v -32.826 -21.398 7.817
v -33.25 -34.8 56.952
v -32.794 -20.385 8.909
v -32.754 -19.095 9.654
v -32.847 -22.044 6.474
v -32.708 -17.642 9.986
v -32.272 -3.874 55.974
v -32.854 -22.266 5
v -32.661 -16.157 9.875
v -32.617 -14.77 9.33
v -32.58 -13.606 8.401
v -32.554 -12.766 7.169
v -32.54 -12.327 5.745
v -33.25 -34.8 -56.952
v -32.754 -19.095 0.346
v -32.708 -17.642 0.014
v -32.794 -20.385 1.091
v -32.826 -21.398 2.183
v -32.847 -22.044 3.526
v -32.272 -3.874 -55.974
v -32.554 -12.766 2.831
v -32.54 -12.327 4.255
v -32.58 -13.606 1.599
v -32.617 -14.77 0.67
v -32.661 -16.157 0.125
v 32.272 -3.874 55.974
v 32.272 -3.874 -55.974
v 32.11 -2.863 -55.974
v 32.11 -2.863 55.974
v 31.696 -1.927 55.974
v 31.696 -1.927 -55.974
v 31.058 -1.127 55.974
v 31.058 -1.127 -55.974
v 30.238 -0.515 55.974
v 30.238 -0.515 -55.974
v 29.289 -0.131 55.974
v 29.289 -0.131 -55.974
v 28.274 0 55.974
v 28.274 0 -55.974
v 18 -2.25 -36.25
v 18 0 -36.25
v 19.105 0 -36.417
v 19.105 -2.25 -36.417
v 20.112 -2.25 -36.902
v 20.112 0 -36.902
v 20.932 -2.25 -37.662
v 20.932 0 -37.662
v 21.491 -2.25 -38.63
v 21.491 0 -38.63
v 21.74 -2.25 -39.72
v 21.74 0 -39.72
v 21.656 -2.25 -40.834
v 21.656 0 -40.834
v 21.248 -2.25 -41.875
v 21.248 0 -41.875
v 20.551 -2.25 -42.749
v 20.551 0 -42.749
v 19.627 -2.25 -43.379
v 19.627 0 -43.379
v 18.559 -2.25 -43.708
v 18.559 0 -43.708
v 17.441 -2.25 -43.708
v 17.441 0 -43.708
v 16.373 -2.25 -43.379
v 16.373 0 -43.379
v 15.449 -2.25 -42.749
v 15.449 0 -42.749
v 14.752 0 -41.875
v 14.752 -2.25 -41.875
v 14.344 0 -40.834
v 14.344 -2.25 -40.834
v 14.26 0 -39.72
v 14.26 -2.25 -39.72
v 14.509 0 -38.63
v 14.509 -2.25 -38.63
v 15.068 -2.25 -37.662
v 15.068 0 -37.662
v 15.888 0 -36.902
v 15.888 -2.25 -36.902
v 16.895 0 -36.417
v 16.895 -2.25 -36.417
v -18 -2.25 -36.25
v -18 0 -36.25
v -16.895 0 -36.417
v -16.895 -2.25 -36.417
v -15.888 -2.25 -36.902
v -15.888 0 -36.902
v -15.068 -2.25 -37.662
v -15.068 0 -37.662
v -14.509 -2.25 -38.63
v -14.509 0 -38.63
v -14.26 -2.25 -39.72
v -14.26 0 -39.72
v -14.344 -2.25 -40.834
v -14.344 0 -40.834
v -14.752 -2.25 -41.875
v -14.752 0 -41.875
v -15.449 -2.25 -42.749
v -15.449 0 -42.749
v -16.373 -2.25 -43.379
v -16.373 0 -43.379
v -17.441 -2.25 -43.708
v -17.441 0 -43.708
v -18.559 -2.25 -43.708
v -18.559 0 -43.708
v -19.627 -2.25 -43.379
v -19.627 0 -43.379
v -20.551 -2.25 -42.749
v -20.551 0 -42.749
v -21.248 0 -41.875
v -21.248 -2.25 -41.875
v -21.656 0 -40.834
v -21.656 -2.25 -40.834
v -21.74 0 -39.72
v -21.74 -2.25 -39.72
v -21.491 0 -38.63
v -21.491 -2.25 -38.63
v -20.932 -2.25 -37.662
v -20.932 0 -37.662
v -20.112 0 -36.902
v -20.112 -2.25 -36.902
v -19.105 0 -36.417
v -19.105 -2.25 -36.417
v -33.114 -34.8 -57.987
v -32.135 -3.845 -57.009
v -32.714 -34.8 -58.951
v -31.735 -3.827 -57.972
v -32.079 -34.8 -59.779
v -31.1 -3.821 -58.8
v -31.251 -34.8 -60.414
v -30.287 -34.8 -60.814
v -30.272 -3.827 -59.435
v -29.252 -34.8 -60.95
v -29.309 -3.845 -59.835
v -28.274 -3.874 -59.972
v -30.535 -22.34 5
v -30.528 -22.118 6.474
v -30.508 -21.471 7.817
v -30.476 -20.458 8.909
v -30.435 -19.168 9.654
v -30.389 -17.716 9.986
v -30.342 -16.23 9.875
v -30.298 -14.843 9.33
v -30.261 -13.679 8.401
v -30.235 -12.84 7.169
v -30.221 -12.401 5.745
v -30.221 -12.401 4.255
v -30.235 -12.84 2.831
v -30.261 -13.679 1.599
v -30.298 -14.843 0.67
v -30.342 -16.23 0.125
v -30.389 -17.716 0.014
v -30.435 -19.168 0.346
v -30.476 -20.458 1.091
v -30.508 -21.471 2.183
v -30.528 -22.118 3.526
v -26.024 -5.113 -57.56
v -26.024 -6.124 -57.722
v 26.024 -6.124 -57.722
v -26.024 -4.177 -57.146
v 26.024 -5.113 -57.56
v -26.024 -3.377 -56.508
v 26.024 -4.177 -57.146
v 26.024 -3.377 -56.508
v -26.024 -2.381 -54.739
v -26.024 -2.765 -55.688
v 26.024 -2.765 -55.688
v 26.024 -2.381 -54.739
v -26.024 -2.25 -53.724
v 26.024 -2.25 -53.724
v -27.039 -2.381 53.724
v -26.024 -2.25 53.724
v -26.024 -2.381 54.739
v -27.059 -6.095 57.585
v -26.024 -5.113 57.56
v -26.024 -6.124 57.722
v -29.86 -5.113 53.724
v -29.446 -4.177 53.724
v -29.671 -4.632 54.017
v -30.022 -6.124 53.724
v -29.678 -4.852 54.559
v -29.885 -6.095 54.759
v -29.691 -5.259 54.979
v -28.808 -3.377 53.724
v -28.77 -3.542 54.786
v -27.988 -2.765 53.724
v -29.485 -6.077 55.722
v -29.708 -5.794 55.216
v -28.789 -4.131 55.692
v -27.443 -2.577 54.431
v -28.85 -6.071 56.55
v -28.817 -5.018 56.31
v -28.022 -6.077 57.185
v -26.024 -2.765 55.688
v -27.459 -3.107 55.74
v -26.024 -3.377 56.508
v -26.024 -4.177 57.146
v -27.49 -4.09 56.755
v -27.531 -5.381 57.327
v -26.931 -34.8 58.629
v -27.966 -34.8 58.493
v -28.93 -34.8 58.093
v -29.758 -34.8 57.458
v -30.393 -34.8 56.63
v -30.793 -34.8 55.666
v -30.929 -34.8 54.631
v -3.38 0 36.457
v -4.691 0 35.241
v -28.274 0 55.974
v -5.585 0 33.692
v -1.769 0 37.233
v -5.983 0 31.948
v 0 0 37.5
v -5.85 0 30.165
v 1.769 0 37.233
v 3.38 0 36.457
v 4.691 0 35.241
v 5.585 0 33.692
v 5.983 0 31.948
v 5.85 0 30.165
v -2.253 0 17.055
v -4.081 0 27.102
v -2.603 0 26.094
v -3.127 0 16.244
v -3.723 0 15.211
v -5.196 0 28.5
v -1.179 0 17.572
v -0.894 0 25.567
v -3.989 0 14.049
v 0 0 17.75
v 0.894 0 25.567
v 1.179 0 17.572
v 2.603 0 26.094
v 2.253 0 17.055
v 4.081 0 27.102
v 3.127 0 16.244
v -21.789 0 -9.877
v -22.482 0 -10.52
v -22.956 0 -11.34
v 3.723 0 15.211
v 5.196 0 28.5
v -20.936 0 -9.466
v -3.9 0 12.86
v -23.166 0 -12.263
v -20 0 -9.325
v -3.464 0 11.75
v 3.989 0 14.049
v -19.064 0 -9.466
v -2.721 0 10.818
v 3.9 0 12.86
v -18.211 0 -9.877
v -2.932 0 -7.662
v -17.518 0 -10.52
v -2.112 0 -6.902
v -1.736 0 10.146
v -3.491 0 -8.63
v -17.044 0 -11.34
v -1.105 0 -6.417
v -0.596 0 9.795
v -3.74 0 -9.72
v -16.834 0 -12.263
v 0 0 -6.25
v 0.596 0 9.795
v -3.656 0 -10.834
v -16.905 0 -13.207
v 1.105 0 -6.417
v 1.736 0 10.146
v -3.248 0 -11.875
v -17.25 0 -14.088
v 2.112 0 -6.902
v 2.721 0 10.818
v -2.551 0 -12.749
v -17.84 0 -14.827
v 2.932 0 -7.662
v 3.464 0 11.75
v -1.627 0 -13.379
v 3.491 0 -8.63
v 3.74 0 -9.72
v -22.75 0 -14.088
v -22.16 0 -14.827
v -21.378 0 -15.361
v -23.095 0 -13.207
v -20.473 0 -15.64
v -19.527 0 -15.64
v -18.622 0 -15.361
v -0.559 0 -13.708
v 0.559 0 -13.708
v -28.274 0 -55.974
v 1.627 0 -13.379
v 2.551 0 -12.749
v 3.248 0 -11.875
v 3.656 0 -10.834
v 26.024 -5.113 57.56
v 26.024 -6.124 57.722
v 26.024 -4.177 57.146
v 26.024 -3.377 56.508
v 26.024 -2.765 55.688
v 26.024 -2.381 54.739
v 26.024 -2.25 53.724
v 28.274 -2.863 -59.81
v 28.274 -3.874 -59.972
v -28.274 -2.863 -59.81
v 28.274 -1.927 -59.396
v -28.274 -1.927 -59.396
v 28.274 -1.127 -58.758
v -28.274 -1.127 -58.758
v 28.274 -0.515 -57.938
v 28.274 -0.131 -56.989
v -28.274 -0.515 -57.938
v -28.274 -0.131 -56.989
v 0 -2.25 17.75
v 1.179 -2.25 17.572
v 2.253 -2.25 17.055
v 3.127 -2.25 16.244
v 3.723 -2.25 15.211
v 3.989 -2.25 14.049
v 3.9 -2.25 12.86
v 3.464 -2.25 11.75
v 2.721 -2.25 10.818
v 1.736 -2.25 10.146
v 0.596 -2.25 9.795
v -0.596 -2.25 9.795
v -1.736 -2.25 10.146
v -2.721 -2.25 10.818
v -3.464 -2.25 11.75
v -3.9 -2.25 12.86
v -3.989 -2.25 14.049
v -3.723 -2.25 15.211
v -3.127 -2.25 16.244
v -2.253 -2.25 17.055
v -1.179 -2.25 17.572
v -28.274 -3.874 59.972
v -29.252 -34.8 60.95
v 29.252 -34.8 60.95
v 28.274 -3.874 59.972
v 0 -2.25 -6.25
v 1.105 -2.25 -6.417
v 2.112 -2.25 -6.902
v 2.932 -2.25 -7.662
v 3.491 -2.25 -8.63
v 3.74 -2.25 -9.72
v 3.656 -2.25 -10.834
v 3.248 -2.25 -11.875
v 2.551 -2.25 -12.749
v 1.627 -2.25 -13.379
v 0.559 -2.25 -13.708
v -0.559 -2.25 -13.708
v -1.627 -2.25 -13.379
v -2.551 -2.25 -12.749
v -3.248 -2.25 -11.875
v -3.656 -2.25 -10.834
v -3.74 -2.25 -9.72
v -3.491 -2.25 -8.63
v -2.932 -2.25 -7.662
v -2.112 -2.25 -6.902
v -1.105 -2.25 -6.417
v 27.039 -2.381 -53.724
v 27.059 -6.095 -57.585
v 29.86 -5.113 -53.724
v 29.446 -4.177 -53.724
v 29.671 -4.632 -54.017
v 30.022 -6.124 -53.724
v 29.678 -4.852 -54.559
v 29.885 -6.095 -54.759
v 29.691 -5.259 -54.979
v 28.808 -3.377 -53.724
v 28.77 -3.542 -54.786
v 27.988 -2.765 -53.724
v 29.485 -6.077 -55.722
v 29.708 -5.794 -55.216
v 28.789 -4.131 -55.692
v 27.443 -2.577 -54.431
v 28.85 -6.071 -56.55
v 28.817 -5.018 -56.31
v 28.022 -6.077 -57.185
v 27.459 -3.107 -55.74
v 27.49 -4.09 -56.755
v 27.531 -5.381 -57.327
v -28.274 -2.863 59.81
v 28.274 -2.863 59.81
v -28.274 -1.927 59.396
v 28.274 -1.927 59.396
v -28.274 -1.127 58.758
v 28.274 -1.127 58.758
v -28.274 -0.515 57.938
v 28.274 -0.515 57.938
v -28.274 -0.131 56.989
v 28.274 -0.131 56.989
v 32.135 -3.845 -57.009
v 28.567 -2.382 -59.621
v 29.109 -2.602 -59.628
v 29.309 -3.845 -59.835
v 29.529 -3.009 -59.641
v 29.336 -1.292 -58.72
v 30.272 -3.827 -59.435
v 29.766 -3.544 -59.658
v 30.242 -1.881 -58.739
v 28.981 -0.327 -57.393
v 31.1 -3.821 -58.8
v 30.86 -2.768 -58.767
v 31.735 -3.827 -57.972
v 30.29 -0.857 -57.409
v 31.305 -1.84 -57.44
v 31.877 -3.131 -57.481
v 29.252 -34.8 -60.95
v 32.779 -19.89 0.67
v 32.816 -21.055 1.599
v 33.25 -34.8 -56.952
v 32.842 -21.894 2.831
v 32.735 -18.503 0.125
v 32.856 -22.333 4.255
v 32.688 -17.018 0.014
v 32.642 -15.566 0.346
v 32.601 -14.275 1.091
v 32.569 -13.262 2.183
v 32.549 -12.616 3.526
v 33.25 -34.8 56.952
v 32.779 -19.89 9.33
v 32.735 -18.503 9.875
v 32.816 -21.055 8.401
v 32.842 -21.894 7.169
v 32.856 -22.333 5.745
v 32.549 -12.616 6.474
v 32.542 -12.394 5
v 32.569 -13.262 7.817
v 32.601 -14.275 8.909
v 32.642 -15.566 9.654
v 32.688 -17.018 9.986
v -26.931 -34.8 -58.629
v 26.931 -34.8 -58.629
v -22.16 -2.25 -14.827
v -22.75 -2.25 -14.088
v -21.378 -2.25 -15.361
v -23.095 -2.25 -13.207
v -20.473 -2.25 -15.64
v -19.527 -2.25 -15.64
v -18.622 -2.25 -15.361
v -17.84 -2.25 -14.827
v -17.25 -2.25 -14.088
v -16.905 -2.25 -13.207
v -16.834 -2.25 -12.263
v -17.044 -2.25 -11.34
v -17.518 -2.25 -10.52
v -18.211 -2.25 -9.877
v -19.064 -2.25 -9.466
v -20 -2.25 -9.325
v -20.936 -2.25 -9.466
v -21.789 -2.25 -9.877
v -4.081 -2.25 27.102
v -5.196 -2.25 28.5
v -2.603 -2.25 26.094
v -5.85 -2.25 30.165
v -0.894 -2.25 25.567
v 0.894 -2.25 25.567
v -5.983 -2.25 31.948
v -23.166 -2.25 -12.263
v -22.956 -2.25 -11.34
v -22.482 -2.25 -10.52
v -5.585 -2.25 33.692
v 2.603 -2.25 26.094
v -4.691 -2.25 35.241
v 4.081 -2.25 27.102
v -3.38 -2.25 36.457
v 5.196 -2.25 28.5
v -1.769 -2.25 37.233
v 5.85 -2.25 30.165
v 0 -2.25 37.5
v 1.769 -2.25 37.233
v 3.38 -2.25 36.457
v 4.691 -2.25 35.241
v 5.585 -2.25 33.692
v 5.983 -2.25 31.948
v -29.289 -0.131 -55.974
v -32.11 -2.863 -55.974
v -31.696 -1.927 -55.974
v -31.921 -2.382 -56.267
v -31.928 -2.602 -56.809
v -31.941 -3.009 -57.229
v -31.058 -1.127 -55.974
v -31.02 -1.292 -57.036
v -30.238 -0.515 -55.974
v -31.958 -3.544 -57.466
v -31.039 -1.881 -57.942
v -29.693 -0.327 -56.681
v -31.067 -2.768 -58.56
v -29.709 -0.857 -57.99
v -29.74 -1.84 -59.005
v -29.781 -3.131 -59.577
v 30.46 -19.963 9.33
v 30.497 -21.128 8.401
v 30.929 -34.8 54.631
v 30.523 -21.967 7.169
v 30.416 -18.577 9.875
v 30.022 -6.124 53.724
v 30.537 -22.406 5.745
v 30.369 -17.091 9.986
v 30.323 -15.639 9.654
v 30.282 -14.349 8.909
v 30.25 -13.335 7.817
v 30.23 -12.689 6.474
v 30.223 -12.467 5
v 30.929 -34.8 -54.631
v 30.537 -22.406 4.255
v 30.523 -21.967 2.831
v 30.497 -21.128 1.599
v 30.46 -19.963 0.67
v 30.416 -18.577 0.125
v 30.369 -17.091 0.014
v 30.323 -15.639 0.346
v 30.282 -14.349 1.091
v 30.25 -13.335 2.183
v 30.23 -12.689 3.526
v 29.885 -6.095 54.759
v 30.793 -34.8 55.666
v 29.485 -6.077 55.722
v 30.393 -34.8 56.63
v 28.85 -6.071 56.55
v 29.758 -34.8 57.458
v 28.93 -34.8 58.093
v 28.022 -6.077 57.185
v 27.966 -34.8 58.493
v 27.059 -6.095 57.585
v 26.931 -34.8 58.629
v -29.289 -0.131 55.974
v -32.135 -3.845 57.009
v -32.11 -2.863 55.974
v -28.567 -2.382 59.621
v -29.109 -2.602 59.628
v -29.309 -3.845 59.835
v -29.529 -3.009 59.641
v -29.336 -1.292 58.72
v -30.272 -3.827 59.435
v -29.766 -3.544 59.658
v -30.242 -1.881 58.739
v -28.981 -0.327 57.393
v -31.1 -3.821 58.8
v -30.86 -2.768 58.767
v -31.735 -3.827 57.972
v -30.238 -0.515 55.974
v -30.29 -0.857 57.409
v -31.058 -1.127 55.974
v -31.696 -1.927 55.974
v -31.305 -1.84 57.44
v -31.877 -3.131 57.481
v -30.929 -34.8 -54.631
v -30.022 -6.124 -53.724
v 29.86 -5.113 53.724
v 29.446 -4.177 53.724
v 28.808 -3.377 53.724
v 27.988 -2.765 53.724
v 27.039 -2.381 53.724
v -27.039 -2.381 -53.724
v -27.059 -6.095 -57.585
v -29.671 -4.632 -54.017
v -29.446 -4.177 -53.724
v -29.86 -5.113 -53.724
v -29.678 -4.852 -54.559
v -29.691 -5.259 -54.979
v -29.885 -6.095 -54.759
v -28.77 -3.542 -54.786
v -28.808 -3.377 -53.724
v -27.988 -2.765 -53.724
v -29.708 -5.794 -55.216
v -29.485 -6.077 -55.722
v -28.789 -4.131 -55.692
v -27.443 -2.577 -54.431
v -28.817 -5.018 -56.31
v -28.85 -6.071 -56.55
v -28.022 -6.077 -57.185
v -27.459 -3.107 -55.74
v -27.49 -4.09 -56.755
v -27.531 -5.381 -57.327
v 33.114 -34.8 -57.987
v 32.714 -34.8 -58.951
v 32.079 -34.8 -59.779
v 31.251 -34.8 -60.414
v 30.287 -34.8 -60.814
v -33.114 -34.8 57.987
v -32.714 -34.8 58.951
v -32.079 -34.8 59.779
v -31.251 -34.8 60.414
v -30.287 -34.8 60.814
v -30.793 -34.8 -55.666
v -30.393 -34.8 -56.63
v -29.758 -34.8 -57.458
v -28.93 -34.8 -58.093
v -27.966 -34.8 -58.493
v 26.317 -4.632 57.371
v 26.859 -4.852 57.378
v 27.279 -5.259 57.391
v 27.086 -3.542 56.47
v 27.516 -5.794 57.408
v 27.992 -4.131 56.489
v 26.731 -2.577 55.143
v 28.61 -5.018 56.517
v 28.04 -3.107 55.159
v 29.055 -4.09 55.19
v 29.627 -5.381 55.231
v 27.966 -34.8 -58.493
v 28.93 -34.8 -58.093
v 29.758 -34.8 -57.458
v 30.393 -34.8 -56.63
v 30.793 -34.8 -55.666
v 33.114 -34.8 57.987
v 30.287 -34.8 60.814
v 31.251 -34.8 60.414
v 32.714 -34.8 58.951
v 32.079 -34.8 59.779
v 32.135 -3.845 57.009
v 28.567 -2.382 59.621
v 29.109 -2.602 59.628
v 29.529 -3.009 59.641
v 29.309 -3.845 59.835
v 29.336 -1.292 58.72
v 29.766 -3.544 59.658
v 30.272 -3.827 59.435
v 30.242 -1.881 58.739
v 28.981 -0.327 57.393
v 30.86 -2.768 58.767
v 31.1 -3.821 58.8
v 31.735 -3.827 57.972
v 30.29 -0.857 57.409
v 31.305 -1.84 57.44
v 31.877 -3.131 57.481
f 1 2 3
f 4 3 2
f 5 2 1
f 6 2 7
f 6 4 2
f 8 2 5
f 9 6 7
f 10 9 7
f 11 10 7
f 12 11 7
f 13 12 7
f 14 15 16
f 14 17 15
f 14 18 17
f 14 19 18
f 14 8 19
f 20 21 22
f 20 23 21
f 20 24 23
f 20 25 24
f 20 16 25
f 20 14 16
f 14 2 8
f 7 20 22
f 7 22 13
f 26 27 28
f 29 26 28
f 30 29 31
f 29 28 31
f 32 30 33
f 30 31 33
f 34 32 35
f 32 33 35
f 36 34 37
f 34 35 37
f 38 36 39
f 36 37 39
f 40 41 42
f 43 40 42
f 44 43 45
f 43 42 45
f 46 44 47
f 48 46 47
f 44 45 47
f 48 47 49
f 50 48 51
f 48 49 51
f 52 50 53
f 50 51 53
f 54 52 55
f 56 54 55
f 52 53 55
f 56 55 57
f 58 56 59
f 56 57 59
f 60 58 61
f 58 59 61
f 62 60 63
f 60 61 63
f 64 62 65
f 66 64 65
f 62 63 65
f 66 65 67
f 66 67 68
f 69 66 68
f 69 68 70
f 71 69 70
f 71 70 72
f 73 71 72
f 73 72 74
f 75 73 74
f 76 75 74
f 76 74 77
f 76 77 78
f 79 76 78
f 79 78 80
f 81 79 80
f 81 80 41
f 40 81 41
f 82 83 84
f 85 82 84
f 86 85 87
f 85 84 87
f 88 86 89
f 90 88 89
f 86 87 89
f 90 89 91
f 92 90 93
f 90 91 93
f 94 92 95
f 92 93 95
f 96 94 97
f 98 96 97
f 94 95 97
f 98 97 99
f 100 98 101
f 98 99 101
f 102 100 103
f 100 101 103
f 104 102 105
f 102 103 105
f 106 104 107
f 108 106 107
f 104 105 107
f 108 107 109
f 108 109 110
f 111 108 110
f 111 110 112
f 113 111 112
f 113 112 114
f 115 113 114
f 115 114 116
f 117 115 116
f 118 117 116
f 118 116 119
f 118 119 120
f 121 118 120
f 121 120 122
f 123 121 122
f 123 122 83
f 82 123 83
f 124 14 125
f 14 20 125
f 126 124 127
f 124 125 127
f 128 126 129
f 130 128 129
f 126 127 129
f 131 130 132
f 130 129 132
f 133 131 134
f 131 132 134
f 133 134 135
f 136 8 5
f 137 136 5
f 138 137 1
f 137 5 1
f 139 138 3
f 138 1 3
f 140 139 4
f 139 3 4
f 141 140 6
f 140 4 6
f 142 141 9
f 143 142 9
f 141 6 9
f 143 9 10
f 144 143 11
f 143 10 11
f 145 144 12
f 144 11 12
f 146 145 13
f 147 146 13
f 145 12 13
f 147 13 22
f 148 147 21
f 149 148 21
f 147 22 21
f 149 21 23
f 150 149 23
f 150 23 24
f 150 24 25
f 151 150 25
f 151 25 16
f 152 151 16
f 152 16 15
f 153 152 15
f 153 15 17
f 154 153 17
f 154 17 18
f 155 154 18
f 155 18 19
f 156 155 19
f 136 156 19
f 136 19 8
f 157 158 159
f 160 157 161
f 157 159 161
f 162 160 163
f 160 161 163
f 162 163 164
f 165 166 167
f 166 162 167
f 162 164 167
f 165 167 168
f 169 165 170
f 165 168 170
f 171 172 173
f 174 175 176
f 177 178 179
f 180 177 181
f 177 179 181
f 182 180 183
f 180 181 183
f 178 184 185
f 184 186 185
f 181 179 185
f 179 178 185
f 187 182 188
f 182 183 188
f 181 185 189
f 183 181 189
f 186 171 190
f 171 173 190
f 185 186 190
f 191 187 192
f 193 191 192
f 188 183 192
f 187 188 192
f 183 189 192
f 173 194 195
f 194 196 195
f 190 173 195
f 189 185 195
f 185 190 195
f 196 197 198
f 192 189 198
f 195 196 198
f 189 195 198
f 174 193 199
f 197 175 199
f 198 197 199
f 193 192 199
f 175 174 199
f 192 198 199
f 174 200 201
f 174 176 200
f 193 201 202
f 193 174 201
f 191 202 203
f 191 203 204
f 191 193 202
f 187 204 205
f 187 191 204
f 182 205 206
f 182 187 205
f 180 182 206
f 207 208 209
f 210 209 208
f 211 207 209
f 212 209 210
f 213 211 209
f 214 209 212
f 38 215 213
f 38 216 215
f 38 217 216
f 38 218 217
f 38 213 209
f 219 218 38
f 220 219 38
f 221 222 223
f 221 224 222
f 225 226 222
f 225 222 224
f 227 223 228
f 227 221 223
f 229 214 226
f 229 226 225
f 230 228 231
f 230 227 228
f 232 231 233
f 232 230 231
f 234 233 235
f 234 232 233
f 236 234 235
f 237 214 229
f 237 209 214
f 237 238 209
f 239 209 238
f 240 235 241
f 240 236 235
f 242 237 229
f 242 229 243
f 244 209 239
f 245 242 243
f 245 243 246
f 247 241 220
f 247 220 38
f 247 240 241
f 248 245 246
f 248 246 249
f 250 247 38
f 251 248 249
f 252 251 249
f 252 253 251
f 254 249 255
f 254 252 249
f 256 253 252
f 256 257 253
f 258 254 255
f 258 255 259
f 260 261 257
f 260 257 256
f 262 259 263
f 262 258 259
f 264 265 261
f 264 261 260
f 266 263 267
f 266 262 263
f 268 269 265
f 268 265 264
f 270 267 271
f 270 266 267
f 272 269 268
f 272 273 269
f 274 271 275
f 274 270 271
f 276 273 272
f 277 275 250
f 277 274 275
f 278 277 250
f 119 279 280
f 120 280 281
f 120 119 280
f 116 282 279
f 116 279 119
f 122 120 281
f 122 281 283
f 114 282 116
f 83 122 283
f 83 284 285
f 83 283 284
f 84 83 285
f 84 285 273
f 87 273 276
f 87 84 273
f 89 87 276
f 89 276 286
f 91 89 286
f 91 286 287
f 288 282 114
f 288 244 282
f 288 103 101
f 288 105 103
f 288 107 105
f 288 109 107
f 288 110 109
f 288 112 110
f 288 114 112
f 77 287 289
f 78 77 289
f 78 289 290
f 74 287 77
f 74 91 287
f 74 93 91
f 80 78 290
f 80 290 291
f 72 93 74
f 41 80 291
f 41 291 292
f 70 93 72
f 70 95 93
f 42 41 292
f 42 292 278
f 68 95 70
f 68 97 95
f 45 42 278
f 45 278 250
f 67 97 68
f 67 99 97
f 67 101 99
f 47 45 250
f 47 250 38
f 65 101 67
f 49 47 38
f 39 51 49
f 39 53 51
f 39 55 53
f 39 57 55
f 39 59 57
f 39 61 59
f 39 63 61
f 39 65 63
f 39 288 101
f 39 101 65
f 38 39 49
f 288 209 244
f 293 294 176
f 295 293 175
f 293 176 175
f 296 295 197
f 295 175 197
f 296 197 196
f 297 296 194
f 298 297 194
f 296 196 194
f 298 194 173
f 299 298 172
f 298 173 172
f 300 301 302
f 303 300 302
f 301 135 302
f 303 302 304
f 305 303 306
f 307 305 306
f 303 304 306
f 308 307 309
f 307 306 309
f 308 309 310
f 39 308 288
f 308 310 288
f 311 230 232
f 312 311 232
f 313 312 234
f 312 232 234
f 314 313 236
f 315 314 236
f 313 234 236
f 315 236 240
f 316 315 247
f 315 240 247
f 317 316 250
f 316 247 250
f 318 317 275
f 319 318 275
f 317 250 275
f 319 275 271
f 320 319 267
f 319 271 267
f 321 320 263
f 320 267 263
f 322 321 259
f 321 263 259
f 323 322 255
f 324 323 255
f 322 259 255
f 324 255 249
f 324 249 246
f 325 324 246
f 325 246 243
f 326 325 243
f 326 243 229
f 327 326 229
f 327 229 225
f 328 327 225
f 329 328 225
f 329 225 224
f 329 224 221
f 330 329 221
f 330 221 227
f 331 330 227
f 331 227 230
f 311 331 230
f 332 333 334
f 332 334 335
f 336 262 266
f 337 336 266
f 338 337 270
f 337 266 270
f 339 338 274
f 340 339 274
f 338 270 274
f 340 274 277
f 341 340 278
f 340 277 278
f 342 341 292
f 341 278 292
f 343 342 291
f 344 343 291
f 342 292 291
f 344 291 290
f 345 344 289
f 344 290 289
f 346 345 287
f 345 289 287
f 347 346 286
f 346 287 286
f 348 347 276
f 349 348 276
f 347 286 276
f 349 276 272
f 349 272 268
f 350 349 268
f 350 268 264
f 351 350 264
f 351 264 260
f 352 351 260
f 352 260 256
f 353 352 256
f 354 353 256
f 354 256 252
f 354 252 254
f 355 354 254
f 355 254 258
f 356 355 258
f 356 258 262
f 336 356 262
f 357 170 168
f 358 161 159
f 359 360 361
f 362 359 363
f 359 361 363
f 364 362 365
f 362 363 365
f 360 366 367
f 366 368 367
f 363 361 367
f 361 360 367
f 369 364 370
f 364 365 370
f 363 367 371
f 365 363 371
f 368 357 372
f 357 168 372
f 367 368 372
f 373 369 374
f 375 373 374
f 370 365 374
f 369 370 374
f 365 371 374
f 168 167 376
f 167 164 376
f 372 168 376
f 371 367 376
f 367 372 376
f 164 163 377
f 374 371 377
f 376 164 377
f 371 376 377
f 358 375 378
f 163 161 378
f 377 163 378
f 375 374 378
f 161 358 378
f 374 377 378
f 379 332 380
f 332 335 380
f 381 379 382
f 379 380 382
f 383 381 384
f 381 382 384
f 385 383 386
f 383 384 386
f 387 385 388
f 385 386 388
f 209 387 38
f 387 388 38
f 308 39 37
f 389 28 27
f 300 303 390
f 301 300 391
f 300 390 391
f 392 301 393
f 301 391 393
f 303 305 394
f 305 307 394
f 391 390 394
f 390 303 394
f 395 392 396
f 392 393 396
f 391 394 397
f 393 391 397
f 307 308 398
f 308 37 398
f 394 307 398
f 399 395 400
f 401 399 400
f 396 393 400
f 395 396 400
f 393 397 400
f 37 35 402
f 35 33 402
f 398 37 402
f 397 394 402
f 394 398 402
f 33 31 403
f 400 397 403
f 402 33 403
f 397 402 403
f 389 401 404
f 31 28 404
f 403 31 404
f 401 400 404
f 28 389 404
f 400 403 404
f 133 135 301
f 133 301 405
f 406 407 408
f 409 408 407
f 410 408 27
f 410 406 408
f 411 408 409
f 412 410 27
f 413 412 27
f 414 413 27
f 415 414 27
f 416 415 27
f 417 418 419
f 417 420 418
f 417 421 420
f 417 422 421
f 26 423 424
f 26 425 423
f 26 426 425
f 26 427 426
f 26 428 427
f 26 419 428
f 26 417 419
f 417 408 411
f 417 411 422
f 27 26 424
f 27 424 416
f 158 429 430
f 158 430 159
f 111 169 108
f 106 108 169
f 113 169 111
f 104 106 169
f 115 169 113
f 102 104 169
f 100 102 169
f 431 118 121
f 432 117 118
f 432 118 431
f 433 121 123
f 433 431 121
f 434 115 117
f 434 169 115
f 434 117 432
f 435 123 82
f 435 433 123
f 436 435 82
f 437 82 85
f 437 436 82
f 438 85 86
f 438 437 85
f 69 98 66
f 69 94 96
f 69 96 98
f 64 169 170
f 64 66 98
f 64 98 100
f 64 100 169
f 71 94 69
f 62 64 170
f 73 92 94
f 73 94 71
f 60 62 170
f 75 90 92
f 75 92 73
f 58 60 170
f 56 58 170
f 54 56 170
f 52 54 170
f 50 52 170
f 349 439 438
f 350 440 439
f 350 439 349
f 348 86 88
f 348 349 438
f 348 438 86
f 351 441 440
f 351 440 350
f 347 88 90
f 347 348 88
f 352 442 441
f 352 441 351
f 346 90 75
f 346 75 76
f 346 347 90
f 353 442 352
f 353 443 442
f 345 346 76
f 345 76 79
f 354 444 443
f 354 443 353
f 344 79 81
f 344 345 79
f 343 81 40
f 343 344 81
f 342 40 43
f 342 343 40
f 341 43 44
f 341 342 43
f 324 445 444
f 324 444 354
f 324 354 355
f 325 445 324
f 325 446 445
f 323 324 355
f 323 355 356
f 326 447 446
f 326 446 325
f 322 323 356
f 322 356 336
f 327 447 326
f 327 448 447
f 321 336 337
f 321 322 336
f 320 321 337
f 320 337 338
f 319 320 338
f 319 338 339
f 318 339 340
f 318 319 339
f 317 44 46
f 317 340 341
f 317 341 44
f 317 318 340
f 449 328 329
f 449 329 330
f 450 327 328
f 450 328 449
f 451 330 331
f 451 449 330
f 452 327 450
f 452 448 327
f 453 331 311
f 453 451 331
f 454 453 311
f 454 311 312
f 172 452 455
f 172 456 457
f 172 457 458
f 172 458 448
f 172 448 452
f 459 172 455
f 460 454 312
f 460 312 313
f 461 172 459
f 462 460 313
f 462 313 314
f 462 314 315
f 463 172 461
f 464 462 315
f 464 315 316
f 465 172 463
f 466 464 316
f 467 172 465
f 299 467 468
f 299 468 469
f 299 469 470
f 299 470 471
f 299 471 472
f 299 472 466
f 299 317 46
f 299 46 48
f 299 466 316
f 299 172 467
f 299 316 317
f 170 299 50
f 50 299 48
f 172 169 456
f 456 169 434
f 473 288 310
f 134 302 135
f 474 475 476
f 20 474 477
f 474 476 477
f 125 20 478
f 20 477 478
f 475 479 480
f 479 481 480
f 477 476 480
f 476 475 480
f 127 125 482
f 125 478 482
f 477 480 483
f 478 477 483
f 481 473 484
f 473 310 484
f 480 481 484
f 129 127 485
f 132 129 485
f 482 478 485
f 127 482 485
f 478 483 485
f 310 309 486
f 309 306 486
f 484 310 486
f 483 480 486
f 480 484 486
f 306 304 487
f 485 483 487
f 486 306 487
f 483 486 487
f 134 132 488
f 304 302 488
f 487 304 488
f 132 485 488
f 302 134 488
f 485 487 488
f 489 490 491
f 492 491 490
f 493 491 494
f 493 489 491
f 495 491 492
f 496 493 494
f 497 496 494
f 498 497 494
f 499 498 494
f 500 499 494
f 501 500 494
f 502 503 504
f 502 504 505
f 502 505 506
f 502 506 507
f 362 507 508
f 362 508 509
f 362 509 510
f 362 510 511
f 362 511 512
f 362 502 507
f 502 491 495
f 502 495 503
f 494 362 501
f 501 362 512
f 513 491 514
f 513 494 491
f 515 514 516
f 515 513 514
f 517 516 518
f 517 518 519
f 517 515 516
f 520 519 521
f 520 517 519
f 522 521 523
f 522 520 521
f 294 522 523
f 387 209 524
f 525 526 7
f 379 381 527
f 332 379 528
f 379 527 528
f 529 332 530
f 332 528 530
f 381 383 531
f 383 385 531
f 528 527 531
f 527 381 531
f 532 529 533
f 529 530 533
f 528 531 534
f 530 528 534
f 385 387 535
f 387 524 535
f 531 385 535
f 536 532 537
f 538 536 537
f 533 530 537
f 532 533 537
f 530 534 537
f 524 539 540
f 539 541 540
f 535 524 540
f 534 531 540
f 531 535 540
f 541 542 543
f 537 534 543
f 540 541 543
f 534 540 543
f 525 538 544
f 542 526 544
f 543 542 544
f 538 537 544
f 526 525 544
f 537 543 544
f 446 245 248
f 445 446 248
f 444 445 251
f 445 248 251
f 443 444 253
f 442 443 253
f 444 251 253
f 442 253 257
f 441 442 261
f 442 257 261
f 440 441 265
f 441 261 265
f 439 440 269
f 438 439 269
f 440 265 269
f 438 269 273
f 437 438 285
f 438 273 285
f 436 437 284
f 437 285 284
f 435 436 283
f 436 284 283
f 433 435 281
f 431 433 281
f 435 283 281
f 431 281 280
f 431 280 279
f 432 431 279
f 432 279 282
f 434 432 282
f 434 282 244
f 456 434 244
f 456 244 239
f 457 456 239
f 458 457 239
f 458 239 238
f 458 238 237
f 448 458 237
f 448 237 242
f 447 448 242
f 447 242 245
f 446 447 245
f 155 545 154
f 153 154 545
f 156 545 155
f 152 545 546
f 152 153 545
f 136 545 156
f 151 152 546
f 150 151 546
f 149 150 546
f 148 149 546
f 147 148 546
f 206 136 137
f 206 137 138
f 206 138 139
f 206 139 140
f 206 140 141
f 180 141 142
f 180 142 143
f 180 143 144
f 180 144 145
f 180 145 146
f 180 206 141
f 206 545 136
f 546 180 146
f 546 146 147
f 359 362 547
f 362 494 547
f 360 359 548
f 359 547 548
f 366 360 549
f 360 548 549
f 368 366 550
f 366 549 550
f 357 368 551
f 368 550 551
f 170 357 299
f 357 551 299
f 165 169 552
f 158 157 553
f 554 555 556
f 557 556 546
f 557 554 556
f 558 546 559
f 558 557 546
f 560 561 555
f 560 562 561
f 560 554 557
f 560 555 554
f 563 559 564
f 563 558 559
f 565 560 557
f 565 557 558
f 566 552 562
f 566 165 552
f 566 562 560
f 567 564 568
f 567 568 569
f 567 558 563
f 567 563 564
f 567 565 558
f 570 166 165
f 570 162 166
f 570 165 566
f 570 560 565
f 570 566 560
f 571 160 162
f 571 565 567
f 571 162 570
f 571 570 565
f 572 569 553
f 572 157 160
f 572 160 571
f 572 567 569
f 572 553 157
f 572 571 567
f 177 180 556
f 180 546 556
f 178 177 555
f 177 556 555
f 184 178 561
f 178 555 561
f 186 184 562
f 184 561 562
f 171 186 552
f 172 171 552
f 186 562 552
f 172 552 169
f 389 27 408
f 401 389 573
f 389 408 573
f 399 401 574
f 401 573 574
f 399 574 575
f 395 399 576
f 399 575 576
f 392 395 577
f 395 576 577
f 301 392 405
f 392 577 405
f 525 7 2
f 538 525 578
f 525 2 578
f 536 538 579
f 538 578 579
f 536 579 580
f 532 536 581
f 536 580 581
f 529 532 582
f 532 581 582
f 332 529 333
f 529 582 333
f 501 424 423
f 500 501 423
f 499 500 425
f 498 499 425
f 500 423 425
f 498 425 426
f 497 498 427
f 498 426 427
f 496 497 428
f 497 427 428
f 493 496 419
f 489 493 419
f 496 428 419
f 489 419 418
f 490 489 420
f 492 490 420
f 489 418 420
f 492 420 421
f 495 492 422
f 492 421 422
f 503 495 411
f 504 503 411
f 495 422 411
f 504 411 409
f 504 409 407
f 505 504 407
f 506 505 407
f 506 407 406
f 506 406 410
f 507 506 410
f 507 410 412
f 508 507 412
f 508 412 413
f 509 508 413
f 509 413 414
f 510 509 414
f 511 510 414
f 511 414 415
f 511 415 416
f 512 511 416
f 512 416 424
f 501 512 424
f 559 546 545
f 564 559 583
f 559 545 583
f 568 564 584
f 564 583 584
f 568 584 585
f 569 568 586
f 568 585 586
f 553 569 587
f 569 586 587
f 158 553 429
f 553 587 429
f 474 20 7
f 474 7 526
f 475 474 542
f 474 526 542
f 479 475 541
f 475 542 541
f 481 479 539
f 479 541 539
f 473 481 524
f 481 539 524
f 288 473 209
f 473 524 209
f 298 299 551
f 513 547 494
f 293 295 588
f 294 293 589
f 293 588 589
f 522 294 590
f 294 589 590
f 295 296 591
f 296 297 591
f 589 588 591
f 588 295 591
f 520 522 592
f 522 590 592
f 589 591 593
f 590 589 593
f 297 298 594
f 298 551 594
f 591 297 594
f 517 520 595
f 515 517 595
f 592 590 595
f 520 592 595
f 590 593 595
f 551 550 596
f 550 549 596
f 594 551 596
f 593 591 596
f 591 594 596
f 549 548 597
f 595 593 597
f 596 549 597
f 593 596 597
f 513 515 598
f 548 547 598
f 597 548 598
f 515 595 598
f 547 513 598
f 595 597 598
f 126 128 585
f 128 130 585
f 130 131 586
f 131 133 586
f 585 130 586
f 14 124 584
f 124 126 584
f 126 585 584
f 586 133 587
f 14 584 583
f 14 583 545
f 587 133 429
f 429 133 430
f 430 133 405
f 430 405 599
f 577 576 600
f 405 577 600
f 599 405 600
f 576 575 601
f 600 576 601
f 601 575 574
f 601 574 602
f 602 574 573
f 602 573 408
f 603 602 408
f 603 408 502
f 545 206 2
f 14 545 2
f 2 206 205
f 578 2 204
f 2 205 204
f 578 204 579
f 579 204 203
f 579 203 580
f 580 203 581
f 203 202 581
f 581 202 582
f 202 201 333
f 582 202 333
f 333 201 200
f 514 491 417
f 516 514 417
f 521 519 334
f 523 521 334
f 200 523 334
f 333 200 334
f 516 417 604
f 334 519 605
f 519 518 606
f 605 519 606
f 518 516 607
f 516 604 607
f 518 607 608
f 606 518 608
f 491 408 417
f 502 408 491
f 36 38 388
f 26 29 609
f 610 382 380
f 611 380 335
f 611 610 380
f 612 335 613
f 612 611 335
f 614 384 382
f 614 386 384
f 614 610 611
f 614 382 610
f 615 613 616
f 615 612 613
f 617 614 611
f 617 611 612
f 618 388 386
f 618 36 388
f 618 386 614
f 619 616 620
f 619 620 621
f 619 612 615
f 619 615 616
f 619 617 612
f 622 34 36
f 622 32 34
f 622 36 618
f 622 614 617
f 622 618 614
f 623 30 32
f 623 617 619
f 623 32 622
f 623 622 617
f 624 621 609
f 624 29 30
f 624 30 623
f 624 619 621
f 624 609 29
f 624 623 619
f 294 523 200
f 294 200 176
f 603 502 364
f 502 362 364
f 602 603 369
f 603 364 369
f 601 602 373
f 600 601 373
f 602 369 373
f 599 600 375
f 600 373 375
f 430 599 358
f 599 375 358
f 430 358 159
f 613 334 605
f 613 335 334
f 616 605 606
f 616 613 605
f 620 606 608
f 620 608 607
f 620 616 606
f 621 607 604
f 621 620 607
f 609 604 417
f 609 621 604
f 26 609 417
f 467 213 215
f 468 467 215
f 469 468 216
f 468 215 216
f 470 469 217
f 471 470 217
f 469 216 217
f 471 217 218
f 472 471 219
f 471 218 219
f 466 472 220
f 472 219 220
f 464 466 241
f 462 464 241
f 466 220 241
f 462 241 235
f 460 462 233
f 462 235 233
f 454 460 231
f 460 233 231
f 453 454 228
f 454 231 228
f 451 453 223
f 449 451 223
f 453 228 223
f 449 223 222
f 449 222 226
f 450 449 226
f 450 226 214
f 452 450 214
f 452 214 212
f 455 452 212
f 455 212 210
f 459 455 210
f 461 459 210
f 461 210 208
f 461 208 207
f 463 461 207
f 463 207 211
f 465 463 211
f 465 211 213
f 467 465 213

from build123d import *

# Parameters (mm, degrees)
SKETCH1_W              = 66.5
SKETCH1_H              = 121.9
BOX_DEPTH              = 34.8
SKETCH4_W              = 62
SKETCH4_H              = 117.4
HOLLOW_DEPTH           = 32.55
SIDE_WALL_DRAFT_SIZE   = 34.8
SIDE_WALL_DRAFT_SIZE_2 = 1.1
CORNER_ROUNDING_R      = 4
SKETCH2_R              = 3.75
SKETCH2_R_2            = 4
SKETCH2_R_3            = 6
SKETCH2_R_4            = 3.175
TOP_SIDE_CUT_DEPTH     = 22.5
SKETCH6_R              = 5
INPUT_JACK_DEPTH       = 10
SKETCH7_R              = 5
OUTPUT_JACK_DEPTH      = 10


with BuildPart() as part:
    # Sketch1 → Box (new body)
    with BuildSketch(Plane(origin=(0, 0, 0), x_dir=(1, 0, 0), z_dir=(0, 1, 0))):
        Rectangle(SKETCH1_W, SKETCH1_H)
    extrude(amount=-BOX_DEPTH)

    # Sketch4 → Hollow (cut)
    with BuildSketch(Plane.XZ.offset(34.8)):
        Rectangle(SKETCH4_W, SKETCH4_H)
    extrude(amount=-HOLLOW_DEPTH, mode=Mode.SUBTRACT)

    # Side wall draft
    # the kernel refuses this chamfer: 34.8, 1.1 mm, written as the material it adds along each edge
    with BuildSketch(Plane(origin=(-31, -2.25, 58.7), x_dir=(-0.001215153825981483, -0.999999261700317, 0), z_dir=(0, 0, -1))) as side_wall_draft_piece_1_section:
        Polygon((SIDE_WALL_DRAFT_SIZE * 0.9999992617, -SIDE_WALL_DRAFT_SIZE * 0.00121515382598), (-SIDE_WALL_DRAFT_SIZE_2 * 0.00121515382598, -SIDE_WALL_DRAFT_SIZE_2 * 0.9999992617), (0, 0), align=None)
    side_wall_draft_piece_1 = extrude(amount=117.4, mode=Mode.PRIVATE)
    side_wall_draft_piece_1 = split(side_wall_draft_piece_1, bisect_by=Plane(origin=(-30.631893643, -34.8, 0), z_dir=(0, 1, 0)), keep=Keep.TOP, mode=Mode.PRIVATE)
    add(side_wall_draft_piece_1)
    with BuildSketch(Plane(origin=(31, -2.25, 58.7), x_dir=(0, -0.999999261700317, 0.0012151538259815812), z_dir=(-1, 0, 0))) as side_wall_draft_piece_2_section:
        Polygon((SIDE_WALL_DRAFT_SIZE * 0.9999992617, -SIDE_WALL_DRAFT_SIZE * 0.00121515382598), (-SIDE_WALL_DRAFT_SIZE_2 * 0.00121515382598, -SIDE_WALL_DRAFT_SIZE_2 * 0.9999992617), (0, 0), align=None)
    side_wall_draft_piece_2 = extrude(amount=62, mode=Mode.PRIVATE)
    side_wall_draft_piece_2 = split(side_wall_draft_piece_2, bisect_by=Plane(origin=(0, -34.8, 58.331893643), z_dir=(0, 1, 0)), keep=Keep.TOP, mode=Mode.PRIVATE)
    add(side_wall_draft_piece_2)
    with BuildSketch(Plane(origin=(31, -2.25, -58.7), x_dir=(0.001215153825981483, -0.999999261700317, 0), z_dir=(0, 0, 1))) as side_wall_draft_piece_3_section:
        Polygon((SIDE_WALL_DRAFT_SIZE * 0.9999992617, -SIDE_WALL_DRAFT_SIZE * 0.00121515382598), (-SIDE_WALL_DRAFT_SIZE_2 * 0.00121515382598, -SIDE_WALL_DRAFT_SIZE_2 * 0.9999992617), (0, 0), align=None)
    side_wall_draft_piece_3 = extrude(amount=117.4, mode=Mode.PRIVATE)
    side_wall_draft_piece_3 = split(side_wall_draft_piece_3, bisect_by=Plane(origin=(30.631893643, -34.8, 0), z_dir=(0, 1, 0)), keep=Keep.TOP, mode=Mode.PRIVATE)
    add(side_wall_draft_piece_3)
    with BuildSketch(Plane(origin=(-31, -2.25, -58.7), x_dir=(0, -0.999999261700317, -0.0012151538259815812), z_dir=(1, 0, 0))) as side_wall_draft_piece_4_section:
        Polygon((SIDE_WALL_DRAFT_SIZE * 0.9999992617, -SIDE_WALL_DRAFT_SIZE * 0.00121515382598), (-SIDE_WALL_DRAFT_SIZE_2 * 0.00121515382598, -SIDE_WALL_DRAFT_SIZE_2 * 0.9999992617), (0, 0), align=None)
    side_wall_draft_piece_4 = extrude(amount=62, mode=Mode.PRIVATE)
    side_wall_draft_piece_4 = split(side_wall_draft_piece_4, bisect_by=Plane(origin=(0, -34.8, -58.331893643), z_dir=(0, 1, 0)), keep=Keep.TOP, mode=Mode.PRIVATE)
    add(side_wall_draft_piece_4)
    # the kernel refuses this chamfer: 34.8, 1.1 mm, written as the material it takes off along each edge
    with BuildSketch(Plane(origin=(-123.728329596, 0, 60.95), x_dir=(0, -0.999999261700317, 0.0012151538259815812), z_dir=(1, 0, 0))) as side_wall_draft_2_piece_1:
        Polygon((SIDE_WALL_DRAFT_SIZE * 0.9999992617, SIDE_WALL_DRAFT_SIZE * 0.00121515382598), (-SIDE_WALL_DRAFT_SIZE_2 * 0.00121515382598, SIDE_WALL_DRAFT_SIZE_2 * 0.9999992617), (0, 0), align=None)
    extrude(amount=247.456659192, mode=Mode.SUBTRACT)
    with BuildSketch(Plane(origin=(-33.25, 0, -151.428329596), x_dir=(-0.0012151538259815812, -0.999999261700317, 0), z_dir=(0, 0, 1)), Plane(origin=(33.25, 0, 151.428329596), x_dir=(0.0012151538259815812, -0.999999261700317, 0), z_dir=(0, 0, -1))) as side_wall_draft_2_piece_2:
        Polygon((SIDE_WALL_DRAFT_SIZE * 0.9999992617, SIDE_WALL_DRAFT_SIZE * 0.00121515382598), (-SIDE_WALL_DRAFT_SIZE_2 * 0.00121515382598, SIDE_WALL_DRAFT_SIZE_2 * 0.9999992617), (0, 0), align=None)
    extrude(amount=302.856659192, mode=Mode.SUBTRACT)
    with BuildSketch(Plane(origin=(123.728329596, 0, -60.95), x_dir=(0, 0.7724211149227607, 0.6351107157192984), z_dir=(-1, 0, 0))) as side_wall_draft_2_piece_3:
        Polygon((SIDE_WALL_DRAFT_SIZE_2 * 0.635110715719, -SIDE_WALL_DRAFT_SIZE_2 * 0.772421114923), (-SIDE_WALL_DRAFT_SIZE * 0.772421114923, -SIDE_WALL_DRAFT_SIZE * 0.635110715719), (0, 0), align=None)
    extrude(amount=247.456659192, mode=Mode.SUBTRACT)

    # Corner rounding
    corner_rounding_edges = [part.edges().sort_by_distance(p)[0] for p in [
        (0, -2.25, -57.6),
        (29.9, -2.25, 0),
        (0, -2.25, 57.6),
        (-29.9, -2.25, 0),
        (32.15, 0, 0),
        (0, 0, -59.85),
        (-32.15, 0, 0),
        (0, 0, 59.85),
        (30.414439655, -18.525, 58.114439655),
        (30.414439655, -18.525, -58.114439655),
        (-30.414439655, -18.525, 58.114439655),
        (-30.414439655, -18.525, -58.114439655),
        (-32.7, -17.4, -60.4),
        (32.7, -17.4, -60.4),
        (-32.7, -17.4, 60.4),
        (32.7, -17.4, 60.4),
    ]]
    fillet(corner_rounding_edges, radius=CORNER_ROUNDING_R)

    # Sketch2 → Top side cut (cut)
    with BuildSketch(Plane(origin=(0, 0, 0), x_dir=(1, 0, 0), z_dir=(0, 1, 0))):
        with Locations(Location((-18, 40, 0), (0, 0, 270))):
            Circle(SKETCH2_R)
        with Locations(Location((0, -13.75, 0), (0, 0, 270))):
            Circle(SKETCH2_R_2)
        with Locations(Location((0, -31.5, 0), (0, 0, 270))):
            Circle(SKETCH2_R_3)
        with Locations(Location((-20, 12.5, 0), (0, 0, 270))):
            Circle(SKETCH2_R_4)
        with Locations(Location((18, 40, 0), (0, 0, 270))):
            Circle(SKETCH2_R)
        with Locations(Location((0, 10, 0), (0, 0, 270))):
            Circle(SKETCH2_R)
    extrude(amount=-TOP_SIDE_CUT_DEPTH, mode=Mode.SUBTRACT)

    # Sketch6 → Input Jack (cut)
    with BuildSketch(Plane(origin=(32.117909672, 1.015221283, 0), x_dir=(0, 0, -1), z_dir=(0.9995008034277885, 0.03159341620030004, 0))):
        with Locations(Location((-5, -18.415728331, 0), (0, 0, 90))):
            Circle(SKETCH6_R)
    extrude(amount=-INPUT_JACK_DEPTH, mode=Mode.SUBTRACT)

    # Sketch7 → Output Jack (cut)
    with BuildSketch(Plane(origin=(-32.117909672, 1.015221283, 0), x_dir=(0, 0, 1), z_dir=(-0.9995008034277885, 0.03159341620030004, 0))):
        with Locations(Location((5, -18.293286119, 0), (0, 0, 270))):
            Circle(SKETCH7_R)
    extrude(amount=-OUTPUT_JACK_DEPTH, mode=Mode.SUBTRACT)


solid = part.part
